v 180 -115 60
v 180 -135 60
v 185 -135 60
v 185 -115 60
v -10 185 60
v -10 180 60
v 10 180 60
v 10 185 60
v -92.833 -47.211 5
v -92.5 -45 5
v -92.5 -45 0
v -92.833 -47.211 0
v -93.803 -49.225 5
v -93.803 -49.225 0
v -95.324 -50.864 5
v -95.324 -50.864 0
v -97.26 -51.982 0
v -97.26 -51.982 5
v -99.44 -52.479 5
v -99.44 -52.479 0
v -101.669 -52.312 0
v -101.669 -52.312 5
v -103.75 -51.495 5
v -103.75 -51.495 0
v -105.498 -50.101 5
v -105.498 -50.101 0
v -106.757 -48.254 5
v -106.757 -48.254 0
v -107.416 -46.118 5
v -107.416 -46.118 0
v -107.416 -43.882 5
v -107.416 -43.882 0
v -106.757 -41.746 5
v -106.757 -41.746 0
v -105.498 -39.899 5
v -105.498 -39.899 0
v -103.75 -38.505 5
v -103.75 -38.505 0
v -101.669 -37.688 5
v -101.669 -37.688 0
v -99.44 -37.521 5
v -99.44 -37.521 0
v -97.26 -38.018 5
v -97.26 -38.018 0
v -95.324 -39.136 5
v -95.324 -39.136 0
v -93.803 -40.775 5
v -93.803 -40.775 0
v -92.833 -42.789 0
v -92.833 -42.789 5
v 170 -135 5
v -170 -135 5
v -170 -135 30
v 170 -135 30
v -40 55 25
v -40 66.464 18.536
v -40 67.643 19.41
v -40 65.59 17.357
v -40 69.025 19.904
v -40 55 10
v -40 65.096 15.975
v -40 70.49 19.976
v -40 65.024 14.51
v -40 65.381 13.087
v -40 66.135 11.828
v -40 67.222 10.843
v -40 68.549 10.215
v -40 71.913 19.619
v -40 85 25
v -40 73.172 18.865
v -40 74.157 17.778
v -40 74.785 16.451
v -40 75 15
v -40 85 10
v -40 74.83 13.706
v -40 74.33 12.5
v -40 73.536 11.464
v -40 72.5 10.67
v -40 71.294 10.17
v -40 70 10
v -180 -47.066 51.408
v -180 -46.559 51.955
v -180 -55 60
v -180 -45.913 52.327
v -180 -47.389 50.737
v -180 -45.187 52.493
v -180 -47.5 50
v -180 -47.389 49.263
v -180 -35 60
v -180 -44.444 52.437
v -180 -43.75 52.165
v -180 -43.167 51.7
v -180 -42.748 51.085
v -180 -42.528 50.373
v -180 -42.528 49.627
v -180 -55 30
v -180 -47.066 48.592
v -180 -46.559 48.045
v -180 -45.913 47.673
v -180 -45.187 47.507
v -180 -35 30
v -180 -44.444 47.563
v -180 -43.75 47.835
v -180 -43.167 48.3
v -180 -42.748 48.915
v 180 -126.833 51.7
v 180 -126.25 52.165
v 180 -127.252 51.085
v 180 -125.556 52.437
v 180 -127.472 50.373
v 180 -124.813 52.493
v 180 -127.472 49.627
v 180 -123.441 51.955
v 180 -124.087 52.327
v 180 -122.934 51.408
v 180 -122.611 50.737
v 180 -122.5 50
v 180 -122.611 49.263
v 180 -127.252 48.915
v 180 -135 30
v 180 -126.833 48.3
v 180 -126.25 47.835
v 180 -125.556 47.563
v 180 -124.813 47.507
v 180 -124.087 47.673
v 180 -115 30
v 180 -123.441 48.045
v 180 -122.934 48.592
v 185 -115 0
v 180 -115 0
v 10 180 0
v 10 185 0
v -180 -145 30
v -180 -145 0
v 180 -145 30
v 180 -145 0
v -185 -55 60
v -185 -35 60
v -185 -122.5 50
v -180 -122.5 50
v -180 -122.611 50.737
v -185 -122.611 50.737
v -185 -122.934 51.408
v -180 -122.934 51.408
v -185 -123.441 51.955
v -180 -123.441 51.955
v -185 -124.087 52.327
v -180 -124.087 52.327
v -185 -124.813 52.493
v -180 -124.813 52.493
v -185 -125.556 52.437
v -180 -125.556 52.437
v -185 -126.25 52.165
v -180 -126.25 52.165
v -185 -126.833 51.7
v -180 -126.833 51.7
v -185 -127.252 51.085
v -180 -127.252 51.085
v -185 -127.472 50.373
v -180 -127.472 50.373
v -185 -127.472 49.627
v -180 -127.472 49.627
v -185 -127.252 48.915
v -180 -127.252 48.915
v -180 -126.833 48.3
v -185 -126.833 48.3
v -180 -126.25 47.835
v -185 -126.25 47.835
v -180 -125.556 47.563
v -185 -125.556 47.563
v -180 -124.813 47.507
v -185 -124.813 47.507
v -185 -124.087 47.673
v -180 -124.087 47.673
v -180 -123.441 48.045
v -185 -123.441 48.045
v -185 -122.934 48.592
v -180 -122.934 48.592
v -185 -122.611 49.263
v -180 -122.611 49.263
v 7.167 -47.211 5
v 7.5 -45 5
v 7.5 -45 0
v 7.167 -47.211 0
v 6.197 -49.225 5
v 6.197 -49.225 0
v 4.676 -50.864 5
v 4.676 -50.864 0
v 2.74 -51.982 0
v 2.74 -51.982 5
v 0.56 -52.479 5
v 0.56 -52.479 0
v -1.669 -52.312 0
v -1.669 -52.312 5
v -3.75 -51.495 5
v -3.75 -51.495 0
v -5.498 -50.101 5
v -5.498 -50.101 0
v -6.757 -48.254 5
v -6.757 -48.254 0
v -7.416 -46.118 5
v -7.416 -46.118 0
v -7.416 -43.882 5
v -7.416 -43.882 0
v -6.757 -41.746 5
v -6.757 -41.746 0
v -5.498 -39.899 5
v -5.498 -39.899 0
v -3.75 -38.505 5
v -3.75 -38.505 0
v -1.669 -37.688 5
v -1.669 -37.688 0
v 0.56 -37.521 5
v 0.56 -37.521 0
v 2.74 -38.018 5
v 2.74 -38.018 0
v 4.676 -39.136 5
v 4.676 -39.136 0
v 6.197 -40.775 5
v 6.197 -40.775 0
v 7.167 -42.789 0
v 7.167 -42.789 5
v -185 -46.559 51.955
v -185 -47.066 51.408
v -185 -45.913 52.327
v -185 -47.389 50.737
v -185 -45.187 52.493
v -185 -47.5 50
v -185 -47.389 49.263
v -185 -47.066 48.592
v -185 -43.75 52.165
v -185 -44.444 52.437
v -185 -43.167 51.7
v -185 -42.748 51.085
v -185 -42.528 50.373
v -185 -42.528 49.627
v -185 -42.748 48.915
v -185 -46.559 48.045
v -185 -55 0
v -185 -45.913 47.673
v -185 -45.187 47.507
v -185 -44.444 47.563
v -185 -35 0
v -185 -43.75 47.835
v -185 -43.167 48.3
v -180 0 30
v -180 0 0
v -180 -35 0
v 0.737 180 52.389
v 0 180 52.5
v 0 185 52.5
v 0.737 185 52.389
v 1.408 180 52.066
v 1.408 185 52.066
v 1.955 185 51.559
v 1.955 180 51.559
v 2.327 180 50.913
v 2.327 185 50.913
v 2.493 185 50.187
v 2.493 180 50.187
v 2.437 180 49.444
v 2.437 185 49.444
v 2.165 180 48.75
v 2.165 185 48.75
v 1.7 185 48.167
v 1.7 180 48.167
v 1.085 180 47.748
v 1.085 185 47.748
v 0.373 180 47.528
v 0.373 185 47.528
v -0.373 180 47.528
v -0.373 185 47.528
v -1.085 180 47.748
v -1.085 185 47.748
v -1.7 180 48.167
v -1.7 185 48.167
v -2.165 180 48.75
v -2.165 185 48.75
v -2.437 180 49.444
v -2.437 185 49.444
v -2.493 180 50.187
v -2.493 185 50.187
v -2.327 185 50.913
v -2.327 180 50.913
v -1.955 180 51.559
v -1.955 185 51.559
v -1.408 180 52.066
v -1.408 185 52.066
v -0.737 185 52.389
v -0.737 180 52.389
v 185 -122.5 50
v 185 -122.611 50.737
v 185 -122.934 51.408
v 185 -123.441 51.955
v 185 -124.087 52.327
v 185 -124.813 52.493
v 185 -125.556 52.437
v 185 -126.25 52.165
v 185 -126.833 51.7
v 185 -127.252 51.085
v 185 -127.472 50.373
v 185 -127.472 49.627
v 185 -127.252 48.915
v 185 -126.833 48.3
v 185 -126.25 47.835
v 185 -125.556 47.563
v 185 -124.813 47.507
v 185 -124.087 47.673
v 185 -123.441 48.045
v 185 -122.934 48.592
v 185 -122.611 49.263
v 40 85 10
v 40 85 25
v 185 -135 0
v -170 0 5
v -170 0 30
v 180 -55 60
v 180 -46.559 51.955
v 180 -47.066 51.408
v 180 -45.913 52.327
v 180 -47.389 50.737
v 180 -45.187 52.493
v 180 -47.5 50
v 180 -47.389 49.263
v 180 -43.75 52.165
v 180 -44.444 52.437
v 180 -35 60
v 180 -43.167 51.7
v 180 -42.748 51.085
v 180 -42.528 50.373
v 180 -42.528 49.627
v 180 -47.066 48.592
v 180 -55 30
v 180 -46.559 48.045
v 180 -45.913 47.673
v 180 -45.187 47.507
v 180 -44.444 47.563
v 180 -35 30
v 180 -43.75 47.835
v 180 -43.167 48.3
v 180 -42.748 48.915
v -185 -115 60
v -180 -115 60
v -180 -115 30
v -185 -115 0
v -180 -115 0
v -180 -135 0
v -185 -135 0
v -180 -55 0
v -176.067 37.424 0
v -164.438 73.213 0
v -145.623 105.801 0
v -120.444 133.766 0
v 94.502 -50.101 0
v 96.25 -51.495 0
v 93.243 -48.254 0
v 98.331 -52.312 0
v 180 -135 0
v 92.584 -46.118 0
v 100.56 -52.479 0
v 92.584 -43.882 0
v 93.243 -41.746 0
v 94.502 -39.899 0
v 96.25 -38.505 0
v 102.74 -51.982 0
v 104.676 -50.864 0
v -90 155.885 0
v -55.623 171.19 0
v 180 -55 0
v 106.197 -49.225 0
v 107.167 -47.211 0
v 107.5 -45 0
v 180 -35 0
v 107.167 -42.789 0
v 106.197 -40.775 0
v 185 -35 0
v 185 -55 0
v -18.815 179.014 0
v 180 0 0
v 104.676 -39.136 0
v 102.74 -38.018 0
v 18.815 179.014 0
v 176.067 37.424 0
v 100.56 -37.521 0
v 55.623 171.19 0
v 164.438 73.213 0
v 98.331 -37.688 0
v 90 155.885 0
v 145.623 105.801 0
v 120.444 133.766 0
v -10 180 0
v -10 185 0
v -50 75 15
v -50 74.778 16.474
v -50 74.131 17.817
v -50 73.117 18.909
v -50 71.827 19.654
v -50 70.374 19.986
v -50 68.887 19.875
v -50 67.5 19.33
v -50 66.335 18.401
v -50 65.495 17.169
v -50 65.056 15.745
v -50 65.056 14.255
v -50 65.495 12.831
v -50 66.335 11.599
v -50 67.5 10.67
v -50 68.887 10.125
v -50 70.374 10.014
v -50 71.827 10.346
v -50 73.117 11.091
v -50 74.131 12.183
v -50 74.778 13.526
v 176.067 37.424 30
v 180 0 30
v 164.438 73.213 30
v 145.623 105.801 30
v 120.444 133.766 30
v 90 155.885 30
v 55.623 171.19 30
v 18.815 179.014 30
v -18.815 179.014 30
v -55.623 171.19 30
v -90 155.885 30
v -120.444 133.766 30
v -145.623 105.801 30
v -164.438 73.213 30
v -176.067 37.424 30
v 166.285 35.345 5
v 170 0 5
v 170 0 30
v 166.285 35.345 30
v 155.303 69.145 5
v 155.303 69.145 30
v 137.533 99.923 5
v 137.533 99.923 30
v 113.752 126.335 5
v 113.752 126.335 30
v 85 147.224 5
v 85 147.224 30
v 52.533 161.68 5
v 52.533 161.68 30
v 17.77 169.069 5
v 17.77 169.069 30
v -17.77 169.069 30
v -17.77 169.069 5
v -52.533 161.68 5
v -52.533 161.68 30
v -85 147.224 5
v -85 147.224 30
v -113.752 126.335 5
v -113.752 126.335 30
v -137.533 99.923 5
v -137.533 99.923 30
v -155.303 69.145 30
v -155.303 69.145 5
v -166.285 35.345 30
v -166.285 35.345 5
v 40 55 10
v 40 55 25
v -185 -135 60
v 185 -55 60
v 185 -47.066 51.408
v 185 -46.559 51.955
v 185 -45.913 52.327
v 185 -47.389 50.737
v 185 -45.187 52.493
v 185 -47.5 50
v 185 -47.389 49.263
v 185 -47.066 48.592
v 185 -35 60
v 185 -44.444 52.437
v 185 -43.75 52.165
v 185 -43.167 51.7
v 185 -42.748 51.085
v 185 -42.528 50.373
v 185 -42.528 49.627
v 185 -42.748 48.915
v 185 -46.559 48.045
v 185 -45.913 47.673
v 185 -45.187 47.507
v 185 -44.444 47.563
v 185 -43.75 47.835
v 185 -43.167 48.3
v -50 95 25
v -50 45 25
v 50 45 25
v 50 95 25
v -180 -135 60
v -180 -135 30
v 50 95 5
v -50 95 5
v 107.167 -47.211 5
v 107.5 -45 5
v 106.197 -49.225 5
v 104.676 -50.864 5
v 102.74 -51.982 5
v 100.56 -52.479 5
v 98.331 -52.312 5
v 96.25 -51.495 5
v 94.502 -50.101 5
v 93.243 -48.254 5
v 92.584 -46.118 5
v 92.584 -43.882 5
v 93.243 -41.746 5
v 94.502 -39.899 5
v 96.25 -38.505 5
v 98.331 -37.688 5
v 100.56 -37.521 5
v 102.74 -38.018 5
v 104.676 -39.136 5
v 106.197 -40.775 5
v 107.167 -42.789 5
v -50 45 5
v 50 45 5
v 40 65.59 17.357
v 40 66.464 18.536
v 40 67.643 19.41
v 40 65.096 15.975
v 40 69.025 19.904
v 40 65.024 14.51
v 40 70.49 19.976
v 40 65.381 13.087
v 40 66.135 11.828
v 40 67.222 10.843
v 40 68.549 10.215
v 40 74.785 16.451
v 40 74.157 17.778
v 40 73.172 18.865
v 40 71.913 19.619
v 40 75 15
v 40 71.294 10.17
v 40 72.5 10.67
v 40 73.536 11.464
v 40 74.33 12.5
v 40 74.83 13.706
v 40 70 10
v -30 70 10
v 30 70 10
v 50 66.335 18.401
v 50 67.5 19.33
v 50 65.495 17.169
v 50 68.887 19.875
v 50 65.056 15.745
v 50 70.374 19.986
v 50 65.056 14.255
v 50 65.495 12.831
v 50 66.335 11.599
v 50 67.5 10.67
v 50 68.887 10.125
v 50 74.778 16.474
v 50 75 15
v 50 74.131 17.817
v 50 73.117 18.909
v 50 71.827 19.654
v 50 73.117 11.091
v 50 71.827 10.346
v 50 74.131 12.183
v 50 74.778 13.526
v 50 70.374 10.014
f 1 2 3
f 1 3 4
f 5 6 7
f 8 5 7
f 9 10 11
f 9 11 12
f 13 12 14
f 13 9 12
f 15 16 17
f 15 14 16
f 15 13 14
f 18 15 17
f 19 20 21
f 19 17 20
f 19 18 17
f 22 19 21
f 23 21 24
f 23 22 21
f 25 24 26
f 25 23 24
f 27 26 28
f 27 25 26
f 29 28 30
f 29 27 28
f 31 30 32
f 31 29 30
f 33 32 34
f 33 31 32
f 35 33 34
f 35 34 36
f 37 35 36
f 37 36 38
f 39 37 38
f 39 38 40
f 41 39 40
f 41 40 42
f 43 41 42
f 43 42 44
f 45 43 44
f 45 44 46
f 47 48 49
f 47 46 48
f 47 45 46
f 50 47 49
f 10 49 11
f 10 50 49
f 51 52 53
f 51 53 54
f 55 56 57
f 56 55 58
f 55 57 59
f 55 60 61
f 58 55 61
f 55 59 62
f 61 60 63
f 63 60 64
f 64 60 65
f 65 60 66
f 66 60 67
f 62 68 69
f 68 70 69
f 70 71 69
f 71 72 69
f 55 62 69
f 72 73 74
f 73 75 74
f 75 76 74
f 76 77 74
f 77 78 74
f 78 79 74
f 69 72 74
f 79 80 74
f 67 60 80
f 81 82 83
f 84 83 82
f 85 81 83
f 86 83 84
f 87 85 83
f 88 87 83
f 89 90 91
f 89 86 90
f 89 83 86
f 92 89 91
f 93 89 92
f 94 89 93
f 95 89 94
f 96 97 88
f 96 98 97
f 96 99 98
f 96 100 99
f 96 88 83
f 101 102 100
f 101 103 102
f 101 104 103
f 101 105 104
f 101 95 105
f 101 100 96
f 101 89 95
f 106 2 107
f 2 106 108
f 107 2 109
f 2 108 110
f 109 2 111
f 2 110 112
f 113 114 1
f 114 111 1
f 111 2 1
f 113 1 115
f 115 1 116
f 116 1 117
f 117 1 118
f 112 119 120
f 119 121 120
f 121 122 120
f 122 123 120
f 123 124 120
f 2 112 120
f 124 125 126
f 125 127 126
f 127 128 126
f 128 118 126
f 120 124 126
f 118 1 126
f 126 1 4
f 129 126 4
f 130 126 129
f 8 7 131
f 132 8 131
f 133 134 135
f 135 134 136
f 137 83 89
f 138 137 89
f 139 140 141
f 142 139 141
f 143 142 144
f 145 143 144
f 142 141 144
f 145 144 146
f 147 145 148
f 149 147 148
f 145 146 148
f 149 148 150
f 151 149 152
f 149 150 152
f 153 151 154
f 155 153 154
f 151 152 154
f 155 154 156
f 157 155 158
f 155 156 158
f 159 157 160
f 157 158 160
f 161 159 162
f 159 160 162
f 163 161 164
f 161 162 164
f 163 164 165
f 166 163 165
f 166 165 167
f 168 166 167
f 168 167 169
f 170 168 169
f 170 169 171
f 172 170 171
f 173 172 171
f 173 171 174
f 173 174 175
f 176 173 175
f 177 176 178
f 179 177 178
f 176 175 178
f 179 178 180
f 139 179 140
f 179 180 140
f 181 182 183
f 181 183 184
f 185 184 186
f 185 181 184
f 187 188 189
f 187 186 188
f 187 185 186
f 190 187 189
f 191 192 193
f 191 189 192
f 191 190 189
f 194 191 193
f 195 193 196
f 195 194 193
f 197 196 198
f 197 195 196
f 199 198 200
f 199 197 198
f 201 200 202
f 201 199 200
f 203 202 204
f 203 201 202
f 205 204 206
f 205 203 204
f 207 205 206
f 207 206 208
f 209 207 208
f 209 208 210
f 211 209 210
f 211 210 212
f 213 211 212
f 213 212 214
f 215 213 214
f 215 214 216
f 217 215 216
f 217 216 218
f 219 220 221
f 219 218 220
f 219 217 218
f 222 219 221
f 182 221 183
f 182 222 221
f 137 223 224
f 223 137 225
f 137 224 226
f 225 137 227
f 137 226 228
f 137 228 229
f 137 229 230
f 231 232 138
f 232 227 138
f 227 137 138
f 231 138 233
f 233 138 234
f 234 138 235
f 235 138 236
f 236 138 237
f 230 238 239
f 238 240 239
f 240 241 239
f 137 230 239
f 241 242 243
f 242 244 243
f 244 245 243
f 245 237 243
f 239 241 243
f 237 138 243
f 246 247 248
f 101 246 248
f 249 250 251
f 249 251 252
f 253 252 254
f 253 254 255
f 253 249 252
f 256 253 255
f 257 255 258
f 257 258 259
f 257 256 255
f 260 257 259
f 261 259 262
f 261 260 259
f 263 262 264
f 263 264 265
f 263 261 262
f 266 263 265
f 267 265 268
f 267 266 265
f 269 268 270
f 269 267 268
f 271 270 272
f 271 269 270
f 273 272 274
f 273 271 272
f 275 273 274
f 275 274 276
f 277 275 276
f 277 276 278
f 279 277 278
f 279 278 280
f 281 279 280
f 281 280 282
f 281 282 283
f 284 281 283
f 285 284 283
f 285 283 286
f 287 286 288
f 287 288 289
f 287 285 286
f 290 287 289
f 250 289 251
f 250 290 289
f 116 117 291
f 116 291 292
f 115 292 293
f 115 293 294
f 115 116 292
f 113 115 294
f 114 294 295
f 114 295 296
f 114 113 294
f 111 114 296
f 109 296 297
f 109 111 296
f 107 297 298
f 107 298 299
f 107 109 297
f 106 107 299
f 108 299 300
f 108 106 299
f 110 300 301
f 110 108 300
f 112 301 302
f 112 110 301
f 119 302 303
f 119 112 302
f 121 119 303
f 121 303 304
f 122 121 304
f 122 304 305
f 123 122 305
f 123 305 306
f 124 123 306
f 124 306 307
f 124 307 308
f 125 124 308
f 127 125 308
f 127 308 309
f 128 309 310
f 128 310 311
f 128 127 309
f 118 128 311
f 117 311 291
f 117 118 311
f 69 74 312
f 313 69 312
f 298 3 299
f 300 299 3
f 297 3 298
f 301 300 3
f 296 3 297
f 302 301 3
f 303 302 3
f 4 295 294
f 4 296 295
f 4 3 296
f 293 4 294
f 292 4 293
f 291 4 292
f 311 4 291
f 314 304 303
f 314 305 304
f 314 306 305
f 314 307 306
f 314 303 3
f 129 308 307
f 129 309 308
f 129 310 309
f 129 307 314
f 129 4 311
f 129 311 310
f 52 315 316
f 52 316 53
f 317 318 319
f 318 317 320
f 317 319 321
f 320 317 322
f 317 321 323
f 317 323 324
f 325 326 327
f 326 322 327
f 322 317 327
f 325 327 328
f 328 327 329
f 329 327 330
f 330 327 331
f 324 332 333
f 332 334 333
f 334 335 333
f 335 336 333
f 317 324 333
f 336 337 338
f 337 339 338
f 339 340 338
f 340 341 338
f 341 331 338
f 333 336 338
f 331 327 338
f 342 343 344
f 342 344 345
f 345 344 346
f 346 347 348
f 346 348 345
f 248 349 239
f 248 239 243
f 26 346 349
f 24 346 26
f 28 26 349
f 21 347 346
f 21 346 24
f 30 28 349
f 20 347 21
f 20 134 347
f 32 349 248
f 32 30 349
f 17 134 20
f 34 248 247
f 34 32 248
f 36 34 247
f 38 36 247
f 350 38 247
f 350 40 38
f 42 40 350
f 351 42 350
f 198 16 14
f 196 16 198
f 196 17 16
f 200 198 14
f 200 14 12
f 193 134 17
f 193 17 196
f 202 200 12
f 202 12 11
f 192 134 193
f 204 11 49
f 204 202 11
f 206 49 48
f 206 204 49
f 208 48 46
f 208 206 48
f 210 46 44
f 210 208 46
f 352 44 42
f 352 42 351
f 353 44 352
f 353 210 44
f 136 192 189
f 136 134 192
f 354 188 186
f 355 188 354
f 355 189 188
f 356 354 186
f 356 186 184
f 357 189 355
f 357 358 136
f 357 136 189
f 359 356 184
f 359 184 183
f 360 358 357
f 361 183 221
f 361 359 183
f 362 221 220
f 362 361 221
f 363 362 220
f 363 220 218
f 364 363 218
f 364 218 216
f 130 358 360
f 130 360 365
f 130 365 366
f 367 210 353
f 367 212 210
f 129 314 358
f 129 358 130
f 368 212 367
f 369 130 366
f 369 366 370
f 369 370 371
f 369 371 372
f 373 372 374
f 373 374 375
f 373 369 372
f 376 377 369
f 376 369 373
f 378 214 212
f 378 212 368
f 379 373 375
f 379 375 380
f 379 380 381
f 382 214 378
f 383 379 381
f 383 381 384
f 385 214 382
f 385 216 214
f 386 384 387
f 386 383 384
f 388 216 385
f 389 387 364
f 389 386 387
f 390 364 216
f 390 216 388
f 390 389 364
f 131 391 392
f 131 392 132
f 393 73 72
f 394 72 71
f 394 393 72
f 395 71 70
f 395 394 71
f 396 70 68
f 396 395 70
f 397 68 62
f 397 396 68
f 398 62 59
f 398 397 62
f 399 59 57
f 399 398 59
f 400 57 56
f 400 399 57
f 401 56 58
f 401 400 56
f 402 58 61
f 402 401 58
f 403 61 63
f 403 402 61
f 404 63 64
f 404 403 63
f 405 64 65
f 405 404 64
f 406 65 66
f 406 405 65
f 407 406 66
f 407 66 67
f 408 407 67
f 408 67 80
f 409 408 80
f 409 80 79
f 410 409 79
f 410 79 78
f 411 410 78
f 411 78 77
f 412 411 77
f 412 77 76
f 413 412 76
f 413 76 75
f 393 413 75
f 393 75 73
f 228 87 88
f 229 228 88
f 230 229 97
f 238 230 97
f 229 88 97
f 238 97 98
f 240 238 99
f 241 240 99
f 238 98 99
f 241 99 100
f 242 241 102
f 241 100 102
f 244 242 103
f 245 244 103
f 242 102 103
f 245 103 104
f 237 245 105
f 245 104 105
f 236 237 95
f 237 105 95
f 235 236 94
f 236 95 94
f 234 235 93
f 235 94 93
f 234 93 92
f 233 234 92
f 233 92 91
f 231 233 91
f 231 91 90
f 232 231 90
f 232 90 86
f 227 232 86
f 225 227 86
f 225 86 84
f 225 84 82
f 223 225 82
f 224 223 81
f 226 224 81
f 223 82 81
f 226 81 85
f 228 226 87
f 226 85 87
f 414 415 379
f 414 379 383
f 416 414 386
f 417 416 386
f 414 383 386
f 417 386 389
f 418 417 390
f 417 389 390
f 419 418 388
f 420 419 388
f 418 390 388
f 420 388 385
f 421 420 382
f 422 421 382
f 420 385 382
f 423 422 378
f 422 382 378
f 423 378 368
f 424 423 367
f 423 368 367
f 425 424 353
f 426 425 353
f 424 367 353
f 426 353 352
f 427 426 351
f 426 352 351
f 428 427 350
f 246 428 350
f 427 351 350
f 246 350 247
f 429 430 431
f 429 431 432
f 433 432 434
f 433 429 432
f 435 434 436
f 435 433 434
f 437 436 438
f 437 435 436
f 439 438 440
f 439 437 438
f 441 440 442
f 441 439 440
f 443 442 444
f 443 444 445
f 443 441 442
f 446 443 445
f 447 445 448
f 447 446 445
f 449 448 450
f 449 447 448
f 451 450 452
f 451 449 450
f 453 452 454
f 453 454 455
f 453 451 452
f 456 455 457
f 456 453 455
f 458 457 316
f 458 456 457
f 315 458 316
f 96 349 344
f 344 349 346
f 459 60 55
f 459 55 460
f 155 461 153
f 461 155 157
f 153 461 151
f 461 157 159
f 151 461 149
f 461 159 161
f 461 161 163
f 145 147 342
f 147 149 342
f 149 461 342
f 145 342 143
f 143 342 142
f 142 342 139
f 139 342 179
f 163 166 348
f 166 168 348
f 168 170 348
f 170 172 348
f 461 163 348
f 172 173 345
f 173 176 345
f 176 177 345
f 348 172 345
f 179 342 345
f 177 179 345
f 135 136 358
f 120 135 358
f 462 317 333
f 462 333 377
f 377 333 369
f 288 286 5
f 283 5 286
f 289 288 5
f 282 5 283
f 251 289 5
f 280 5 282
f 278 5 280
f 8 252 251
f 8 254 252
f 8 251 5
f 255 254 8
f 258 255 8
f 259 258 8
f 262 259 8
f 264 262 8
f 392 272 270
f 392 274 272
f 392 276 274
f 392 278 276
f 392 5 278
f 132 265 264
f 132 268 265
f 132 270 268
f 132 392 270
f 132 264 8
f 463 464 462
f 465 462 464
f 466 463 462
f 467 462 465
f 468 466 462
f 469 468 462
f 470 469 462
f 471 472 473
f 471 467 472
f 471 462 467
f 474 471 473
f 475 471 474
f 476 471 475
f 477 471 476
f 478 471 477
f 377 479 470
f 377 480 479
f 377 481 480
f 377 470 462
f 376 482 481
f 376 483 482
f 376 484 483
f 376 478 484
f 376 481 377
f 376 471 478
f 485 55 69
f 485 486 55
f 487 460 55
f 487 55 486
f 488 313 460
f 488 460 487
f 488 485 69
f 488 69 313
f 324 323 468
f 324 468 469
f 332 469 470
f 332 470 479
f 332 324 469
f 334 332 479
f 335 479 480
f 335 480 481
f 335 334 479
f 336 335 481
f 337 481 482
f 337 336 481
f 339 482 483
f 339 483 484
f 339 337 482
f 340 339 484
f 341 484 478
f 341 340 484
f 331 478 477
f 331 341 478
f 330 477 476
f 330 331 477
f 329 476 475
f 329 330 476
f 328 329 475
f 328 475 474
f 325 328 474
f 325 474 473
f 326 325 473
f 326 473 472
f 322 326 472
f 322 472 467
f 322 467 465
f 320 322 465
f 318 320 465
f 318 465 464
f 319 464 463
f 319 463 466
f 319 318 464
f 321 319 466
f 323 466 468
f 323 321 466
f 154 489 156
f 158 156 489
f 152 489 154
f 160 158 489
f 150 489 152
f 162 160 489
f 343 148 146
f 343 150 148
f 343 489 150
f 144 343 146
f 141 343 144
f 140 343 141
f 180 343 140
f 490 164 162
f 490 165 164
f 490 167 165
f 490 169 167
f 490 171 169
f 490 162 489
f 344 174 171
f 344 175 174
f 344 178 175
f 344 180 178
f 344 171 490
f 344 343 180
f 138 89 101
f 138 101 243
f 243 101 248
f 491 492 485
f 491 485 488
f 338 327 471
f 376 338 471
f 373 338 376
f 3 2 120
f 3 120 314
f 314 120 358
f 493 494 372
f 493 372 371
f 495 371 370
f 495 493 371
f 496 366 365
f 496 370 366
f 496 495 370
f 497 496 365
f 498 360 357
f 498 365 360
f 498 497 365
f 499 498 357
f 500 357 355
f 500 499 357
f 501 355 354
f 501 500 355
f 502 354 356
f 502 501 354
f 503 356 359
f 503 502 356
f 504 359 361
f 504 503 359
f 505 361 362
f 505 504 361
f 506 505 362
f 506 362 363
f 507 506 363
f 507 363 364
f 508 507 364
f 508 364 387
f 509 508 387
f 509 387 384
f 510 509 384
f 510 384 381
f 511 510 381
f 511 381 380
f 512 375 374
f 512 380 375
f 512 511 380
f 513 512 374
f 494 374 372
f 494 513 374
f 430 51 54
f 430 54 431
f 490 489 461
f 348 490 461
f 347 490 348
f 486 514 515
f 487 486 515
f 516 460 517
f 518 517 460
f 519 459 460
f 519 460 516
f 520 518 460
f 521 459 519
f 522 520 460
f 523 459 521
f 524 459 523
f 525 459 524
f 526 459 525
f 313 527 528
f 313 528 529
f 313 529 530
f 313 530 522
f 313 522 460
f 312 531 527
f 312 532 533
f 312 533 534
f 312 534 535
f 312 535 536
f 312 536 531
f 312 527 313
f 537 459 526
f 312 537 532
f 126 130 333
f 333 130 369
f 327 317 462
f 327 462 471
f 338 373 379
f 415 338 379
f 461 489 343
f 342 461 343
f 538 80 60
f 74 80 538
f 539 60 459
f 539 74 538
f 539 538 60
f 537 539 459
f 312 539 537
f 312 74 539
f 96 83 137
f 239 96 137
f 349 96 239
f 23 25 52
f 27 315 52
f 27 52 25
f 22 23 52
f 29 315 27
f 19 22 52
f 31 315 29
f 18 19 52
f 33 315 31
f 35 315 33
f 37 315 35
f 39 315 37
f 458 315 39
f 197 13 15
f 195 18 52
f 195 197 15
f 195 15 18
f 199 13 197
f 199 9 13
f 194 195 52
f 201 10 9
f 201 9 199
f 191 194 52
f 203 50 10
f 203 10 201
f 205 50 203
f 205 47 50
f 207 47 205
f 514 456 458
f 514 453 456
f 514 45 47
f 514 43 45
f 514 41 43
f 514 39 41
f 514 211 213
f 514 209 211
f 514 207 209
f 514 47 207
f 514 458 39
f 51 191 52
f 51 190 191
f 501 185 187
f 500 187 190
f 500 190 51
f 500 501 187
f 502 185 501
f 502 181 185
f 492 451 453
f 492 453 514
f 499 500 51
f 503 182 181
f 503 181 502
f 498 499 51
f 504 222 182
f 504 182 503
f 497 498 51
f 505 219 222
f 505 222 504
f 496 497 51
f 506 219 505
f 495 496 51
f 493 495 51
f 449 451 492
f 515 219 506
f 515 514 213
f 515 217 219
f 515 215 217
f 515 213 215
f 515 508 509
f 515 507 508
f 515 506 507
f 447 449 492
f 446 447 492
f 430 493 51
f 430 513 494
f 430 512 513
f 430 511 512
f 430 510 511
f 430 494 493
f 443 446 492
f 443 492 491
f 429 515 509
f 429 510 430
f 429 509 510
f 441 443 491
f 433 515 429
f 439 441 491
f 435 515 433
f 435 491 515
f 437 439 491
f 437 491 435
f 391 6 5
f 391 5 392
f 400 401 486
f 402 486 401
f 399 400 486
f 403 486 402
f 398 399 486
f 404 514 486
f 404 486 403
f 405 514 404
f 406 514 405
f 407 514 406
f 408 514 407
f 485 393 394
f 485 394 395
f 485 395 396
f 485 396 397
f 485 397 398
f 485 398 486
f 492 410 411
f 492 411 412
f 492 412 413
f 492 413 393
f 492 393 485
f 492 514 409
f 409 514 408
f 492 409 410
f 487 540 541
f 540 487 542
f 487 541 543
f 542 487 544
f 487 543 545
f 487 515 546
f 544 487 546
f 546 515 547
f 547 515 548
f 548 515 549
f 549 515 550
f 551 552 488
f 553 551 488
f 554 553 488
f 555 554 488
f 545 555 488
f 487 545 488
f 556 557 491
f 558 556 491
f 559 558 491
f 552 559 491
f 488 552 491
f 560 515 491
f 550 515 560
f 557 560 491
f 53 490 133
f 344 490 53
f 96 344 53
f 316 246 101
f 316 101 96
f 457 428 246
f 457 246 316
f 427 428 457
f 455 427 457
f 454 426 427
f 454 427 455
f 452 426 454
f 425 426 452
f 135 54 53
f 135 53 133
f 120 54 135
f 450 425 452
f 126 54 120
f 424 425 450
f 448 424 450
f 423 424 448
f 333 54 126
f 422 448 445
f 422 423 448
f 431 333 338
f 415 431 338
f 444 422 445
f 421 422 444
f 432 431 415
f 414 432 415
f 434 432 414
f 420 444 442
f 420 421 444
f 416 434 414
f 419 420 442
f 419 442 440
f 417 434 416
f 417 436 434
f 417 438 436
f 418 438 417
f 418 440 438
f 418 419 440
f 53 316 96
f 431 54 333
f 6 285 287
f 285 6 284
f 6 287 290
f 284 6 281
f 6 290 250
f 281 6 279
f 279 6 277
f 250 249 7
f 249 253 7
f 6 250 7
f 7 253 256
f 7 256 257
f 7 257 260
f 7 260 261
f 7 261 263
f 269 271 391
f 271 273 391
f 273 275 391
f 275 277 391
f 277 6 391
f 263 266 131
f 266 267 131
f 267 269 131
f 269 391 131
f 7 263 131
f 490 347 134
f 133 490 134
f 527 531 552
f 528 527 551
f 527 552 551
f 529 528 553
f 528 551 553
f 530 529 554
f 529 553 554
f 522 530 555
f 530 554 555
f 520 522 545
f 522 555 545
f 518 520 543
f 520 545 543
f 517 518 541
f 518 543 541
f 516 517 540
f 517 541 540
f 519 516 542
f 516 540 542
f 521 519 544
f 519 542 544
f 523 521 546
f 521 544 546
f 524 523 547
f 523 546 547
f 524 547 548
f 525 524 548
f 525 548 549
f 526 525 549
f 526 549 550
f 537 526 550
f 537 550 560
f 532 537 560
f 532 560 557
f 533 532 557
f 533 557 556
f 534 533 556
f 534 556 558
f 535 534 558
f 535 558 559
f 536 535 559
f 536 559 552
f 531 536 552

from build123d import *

# Parameters (mm, degrees)
BOSS_EXTRUDE1_DEPTH     = 5
BOSS_EXTRUDE2_DEPTH     = 30
SKETCH4_W               = 100
SKETCH4_H               = 50
BOSS_EXTRUDE3_DEPTH     = 20
SHELL1_T                = -10
SKETCH5_R               = 5
CUT_EXTRUDE1_DEPTH      = 20
SKETCH6_W               = 60
SKETCH6_H               = 20
SKETCH6_R               = 2.5
BOSS_EXTRUDE4_DEPTH     = 5
SKETCH8_W               = 20
SKETCH8_H               = 60
SKETCH8_R               = 2.5
BOSS_EXTRUDE5_DEPTH     = 5
CUT_EXTRUDE2_DEPTH      = 269.421310629
CUT_EXTRUDE2_DEPTH_BACK = 269.421310629
SKETCH9_R               = 7.5


with BuildPart() as part:
    # Sketch1 → Boss-Extrude1 (new body)
    with BuildSketch(Plane.XY):
        with BuildLine():
            Line((-180, 0), (-180, -145))
            Line((-180, -145), (180, -145))
            Line((180, -145), (180, 0))
            ThreePointArc((180, 0), (0, 180), (-180, 0))
        make_face()
    extrude(amount=BOSS_EXTRUDE1_DEPTH)

    # Sketch3 → Boss-Extrude2 (add)
    with BuildSketch(Plane.XY):
        with BuildLine():
            Line((-180, 0), (-180, -145))
            Line((-180, -145), (180, -145))
            Line((180, -145), (180, 0))
            ThreePointArc((180, 0), (0, 180), (-180, 0))
        make_face()
        with BuildLine():
            Line((-170, 0), (-170, -135))
            Line((-170, -135), (170, -135))
            Line((170, -135), (170, 0))
            ThreePointArc((170, 0), (0, 170), (-170, 0))
        make_face(mode=Mode.SUBTRACT)
    extrude(amount=BOSS_EXTRUDE2_DEPTH)

    # Sketch4 → Boss-Extrude3 (add)
    with BuildSketch(Plane.XY.offset(5)):
        with Locations((0, 70)):
            Rectangle(SKETCH4_W, SKETCH4_H)
    extrude(amount=BOSS_EXTRUDE3_DEPTH)

    # Shell1
    shell1_openings = [part.faces().sort_by_distance(p)[0] for p in [
        (0, 70, 25),
    ]]
    offset(amount=SHELL1_T, openings=shell1_openings)

    # Sketch5 → Cut-Extrude1 (cut)
    with BuildSketch(Plane(origin=(50, 0, 0), x_dir=(0, 0, -1), z_dir=(1, 0, 0))):
        with Locations(Location((-15, 70, 0), (0, 0, 90))):
            Circle(SKETCH5_R)
    cut_extrude1 = extrude(amount=-CUT_EXTRUDE1_DEPTH, mode=Mode.SUBTRACT)

    # Mirror1: Cut-Extrude1 across plane
    add(cut_extrude1.mirror(Plane(origin=(0, 0, 0), x_dir=(0, 0, 1), z_dir=(1, 0, 0))), mode=Mode.SUBTRACT)

    # Sketch6 → Boss-Extrude4 (add)
    # profile 1 of 2: a face of its own
    with BuildSketch(Plane(origin=(180, 0, 0), x_dir=(0, 0, -1), z_dir=(1, 0, 0))):
        with Locations((-30, -125)):
            Rectangle(SKETCH6_W, SKETCH6_H)
        with Locations(Location((-50, -125, 0), (0, 0, 90))):
            Circle(SKETCH6_R, mode=Mode.SUBTRACT)
    # profile 2 of 2: a face of its own
    with BuildSketch(Plane(origin=(180, 0, 0), x_dir=(0, 0, -1), z_dir=(1, 0, 0))):
        with Locations((-30, -45)):
            Rectangle(SKETCH6_W, SKETCH6_H)
        with Locations(Location((-50, -45, 0), (0, 0, 270))):
            Circle(SKETCH6_R, mode=Mode.SUBTRACT)
    boss_extrude4 = extrude(amount=BOSS_EXTRUDE4_DEPTH)

    # Mirror2: Boss-Extrude4 across plane
    add(boss_extrude4.mirror(Plane(origin=(0, 0, 0), x_dir=(0, 0, 1), z_dir=(1, 0, 0))))

    # Sketch9 → Cut-Extrude2 (cut, two sides: drawn at the far end of the back side and taken through both)
    with BuildSketch(Plane(origin=(0, 0, 0), x_dir=(-1, 0, 0), z_dir=(0, 0, -1)).offset(-CUT_EXTRUDE2_DEPTH_BACK)):
        with Locations(Location((-100, -45, 0), (0, 0, 180))):
            Circle(SKETCH9_R)
        with Locations(Location((0, -45, 0), (0, 0, 180))):
            Circle(SKETCH9_R)
        with Locations(Location((100, -45, 0), (0, 0, 180))):
            Circle(SKETCH9_R)
    extrude(amount=CUT_EXTRUDE2_DEPTH + CUT_EXTRUDE2_DEPTH_BACK, mode=Mode.SUBTRACT)


with BuildPart() as body_2:
    # Sketch8 → Boss-Extrude5 (new body)
    with BuildSketch(Plane(origin=(0, 180, 0), x_dir=(1, 0, 0), z_dir=(0, 1, 0))):
        with Locations((0, -30)):
            Rectangle(SKETCH8_W, SKETCH8_H)
        with Locations(Location((0, -50, 0), (0, 0, 270))):
            Circle(SKETCH8_R, mode=Mode.SUBTRACT)
    extrude(amount=BOSS_EXTRUDE5_DEPTH)


solid = Compound([part.part, body_2.part])
